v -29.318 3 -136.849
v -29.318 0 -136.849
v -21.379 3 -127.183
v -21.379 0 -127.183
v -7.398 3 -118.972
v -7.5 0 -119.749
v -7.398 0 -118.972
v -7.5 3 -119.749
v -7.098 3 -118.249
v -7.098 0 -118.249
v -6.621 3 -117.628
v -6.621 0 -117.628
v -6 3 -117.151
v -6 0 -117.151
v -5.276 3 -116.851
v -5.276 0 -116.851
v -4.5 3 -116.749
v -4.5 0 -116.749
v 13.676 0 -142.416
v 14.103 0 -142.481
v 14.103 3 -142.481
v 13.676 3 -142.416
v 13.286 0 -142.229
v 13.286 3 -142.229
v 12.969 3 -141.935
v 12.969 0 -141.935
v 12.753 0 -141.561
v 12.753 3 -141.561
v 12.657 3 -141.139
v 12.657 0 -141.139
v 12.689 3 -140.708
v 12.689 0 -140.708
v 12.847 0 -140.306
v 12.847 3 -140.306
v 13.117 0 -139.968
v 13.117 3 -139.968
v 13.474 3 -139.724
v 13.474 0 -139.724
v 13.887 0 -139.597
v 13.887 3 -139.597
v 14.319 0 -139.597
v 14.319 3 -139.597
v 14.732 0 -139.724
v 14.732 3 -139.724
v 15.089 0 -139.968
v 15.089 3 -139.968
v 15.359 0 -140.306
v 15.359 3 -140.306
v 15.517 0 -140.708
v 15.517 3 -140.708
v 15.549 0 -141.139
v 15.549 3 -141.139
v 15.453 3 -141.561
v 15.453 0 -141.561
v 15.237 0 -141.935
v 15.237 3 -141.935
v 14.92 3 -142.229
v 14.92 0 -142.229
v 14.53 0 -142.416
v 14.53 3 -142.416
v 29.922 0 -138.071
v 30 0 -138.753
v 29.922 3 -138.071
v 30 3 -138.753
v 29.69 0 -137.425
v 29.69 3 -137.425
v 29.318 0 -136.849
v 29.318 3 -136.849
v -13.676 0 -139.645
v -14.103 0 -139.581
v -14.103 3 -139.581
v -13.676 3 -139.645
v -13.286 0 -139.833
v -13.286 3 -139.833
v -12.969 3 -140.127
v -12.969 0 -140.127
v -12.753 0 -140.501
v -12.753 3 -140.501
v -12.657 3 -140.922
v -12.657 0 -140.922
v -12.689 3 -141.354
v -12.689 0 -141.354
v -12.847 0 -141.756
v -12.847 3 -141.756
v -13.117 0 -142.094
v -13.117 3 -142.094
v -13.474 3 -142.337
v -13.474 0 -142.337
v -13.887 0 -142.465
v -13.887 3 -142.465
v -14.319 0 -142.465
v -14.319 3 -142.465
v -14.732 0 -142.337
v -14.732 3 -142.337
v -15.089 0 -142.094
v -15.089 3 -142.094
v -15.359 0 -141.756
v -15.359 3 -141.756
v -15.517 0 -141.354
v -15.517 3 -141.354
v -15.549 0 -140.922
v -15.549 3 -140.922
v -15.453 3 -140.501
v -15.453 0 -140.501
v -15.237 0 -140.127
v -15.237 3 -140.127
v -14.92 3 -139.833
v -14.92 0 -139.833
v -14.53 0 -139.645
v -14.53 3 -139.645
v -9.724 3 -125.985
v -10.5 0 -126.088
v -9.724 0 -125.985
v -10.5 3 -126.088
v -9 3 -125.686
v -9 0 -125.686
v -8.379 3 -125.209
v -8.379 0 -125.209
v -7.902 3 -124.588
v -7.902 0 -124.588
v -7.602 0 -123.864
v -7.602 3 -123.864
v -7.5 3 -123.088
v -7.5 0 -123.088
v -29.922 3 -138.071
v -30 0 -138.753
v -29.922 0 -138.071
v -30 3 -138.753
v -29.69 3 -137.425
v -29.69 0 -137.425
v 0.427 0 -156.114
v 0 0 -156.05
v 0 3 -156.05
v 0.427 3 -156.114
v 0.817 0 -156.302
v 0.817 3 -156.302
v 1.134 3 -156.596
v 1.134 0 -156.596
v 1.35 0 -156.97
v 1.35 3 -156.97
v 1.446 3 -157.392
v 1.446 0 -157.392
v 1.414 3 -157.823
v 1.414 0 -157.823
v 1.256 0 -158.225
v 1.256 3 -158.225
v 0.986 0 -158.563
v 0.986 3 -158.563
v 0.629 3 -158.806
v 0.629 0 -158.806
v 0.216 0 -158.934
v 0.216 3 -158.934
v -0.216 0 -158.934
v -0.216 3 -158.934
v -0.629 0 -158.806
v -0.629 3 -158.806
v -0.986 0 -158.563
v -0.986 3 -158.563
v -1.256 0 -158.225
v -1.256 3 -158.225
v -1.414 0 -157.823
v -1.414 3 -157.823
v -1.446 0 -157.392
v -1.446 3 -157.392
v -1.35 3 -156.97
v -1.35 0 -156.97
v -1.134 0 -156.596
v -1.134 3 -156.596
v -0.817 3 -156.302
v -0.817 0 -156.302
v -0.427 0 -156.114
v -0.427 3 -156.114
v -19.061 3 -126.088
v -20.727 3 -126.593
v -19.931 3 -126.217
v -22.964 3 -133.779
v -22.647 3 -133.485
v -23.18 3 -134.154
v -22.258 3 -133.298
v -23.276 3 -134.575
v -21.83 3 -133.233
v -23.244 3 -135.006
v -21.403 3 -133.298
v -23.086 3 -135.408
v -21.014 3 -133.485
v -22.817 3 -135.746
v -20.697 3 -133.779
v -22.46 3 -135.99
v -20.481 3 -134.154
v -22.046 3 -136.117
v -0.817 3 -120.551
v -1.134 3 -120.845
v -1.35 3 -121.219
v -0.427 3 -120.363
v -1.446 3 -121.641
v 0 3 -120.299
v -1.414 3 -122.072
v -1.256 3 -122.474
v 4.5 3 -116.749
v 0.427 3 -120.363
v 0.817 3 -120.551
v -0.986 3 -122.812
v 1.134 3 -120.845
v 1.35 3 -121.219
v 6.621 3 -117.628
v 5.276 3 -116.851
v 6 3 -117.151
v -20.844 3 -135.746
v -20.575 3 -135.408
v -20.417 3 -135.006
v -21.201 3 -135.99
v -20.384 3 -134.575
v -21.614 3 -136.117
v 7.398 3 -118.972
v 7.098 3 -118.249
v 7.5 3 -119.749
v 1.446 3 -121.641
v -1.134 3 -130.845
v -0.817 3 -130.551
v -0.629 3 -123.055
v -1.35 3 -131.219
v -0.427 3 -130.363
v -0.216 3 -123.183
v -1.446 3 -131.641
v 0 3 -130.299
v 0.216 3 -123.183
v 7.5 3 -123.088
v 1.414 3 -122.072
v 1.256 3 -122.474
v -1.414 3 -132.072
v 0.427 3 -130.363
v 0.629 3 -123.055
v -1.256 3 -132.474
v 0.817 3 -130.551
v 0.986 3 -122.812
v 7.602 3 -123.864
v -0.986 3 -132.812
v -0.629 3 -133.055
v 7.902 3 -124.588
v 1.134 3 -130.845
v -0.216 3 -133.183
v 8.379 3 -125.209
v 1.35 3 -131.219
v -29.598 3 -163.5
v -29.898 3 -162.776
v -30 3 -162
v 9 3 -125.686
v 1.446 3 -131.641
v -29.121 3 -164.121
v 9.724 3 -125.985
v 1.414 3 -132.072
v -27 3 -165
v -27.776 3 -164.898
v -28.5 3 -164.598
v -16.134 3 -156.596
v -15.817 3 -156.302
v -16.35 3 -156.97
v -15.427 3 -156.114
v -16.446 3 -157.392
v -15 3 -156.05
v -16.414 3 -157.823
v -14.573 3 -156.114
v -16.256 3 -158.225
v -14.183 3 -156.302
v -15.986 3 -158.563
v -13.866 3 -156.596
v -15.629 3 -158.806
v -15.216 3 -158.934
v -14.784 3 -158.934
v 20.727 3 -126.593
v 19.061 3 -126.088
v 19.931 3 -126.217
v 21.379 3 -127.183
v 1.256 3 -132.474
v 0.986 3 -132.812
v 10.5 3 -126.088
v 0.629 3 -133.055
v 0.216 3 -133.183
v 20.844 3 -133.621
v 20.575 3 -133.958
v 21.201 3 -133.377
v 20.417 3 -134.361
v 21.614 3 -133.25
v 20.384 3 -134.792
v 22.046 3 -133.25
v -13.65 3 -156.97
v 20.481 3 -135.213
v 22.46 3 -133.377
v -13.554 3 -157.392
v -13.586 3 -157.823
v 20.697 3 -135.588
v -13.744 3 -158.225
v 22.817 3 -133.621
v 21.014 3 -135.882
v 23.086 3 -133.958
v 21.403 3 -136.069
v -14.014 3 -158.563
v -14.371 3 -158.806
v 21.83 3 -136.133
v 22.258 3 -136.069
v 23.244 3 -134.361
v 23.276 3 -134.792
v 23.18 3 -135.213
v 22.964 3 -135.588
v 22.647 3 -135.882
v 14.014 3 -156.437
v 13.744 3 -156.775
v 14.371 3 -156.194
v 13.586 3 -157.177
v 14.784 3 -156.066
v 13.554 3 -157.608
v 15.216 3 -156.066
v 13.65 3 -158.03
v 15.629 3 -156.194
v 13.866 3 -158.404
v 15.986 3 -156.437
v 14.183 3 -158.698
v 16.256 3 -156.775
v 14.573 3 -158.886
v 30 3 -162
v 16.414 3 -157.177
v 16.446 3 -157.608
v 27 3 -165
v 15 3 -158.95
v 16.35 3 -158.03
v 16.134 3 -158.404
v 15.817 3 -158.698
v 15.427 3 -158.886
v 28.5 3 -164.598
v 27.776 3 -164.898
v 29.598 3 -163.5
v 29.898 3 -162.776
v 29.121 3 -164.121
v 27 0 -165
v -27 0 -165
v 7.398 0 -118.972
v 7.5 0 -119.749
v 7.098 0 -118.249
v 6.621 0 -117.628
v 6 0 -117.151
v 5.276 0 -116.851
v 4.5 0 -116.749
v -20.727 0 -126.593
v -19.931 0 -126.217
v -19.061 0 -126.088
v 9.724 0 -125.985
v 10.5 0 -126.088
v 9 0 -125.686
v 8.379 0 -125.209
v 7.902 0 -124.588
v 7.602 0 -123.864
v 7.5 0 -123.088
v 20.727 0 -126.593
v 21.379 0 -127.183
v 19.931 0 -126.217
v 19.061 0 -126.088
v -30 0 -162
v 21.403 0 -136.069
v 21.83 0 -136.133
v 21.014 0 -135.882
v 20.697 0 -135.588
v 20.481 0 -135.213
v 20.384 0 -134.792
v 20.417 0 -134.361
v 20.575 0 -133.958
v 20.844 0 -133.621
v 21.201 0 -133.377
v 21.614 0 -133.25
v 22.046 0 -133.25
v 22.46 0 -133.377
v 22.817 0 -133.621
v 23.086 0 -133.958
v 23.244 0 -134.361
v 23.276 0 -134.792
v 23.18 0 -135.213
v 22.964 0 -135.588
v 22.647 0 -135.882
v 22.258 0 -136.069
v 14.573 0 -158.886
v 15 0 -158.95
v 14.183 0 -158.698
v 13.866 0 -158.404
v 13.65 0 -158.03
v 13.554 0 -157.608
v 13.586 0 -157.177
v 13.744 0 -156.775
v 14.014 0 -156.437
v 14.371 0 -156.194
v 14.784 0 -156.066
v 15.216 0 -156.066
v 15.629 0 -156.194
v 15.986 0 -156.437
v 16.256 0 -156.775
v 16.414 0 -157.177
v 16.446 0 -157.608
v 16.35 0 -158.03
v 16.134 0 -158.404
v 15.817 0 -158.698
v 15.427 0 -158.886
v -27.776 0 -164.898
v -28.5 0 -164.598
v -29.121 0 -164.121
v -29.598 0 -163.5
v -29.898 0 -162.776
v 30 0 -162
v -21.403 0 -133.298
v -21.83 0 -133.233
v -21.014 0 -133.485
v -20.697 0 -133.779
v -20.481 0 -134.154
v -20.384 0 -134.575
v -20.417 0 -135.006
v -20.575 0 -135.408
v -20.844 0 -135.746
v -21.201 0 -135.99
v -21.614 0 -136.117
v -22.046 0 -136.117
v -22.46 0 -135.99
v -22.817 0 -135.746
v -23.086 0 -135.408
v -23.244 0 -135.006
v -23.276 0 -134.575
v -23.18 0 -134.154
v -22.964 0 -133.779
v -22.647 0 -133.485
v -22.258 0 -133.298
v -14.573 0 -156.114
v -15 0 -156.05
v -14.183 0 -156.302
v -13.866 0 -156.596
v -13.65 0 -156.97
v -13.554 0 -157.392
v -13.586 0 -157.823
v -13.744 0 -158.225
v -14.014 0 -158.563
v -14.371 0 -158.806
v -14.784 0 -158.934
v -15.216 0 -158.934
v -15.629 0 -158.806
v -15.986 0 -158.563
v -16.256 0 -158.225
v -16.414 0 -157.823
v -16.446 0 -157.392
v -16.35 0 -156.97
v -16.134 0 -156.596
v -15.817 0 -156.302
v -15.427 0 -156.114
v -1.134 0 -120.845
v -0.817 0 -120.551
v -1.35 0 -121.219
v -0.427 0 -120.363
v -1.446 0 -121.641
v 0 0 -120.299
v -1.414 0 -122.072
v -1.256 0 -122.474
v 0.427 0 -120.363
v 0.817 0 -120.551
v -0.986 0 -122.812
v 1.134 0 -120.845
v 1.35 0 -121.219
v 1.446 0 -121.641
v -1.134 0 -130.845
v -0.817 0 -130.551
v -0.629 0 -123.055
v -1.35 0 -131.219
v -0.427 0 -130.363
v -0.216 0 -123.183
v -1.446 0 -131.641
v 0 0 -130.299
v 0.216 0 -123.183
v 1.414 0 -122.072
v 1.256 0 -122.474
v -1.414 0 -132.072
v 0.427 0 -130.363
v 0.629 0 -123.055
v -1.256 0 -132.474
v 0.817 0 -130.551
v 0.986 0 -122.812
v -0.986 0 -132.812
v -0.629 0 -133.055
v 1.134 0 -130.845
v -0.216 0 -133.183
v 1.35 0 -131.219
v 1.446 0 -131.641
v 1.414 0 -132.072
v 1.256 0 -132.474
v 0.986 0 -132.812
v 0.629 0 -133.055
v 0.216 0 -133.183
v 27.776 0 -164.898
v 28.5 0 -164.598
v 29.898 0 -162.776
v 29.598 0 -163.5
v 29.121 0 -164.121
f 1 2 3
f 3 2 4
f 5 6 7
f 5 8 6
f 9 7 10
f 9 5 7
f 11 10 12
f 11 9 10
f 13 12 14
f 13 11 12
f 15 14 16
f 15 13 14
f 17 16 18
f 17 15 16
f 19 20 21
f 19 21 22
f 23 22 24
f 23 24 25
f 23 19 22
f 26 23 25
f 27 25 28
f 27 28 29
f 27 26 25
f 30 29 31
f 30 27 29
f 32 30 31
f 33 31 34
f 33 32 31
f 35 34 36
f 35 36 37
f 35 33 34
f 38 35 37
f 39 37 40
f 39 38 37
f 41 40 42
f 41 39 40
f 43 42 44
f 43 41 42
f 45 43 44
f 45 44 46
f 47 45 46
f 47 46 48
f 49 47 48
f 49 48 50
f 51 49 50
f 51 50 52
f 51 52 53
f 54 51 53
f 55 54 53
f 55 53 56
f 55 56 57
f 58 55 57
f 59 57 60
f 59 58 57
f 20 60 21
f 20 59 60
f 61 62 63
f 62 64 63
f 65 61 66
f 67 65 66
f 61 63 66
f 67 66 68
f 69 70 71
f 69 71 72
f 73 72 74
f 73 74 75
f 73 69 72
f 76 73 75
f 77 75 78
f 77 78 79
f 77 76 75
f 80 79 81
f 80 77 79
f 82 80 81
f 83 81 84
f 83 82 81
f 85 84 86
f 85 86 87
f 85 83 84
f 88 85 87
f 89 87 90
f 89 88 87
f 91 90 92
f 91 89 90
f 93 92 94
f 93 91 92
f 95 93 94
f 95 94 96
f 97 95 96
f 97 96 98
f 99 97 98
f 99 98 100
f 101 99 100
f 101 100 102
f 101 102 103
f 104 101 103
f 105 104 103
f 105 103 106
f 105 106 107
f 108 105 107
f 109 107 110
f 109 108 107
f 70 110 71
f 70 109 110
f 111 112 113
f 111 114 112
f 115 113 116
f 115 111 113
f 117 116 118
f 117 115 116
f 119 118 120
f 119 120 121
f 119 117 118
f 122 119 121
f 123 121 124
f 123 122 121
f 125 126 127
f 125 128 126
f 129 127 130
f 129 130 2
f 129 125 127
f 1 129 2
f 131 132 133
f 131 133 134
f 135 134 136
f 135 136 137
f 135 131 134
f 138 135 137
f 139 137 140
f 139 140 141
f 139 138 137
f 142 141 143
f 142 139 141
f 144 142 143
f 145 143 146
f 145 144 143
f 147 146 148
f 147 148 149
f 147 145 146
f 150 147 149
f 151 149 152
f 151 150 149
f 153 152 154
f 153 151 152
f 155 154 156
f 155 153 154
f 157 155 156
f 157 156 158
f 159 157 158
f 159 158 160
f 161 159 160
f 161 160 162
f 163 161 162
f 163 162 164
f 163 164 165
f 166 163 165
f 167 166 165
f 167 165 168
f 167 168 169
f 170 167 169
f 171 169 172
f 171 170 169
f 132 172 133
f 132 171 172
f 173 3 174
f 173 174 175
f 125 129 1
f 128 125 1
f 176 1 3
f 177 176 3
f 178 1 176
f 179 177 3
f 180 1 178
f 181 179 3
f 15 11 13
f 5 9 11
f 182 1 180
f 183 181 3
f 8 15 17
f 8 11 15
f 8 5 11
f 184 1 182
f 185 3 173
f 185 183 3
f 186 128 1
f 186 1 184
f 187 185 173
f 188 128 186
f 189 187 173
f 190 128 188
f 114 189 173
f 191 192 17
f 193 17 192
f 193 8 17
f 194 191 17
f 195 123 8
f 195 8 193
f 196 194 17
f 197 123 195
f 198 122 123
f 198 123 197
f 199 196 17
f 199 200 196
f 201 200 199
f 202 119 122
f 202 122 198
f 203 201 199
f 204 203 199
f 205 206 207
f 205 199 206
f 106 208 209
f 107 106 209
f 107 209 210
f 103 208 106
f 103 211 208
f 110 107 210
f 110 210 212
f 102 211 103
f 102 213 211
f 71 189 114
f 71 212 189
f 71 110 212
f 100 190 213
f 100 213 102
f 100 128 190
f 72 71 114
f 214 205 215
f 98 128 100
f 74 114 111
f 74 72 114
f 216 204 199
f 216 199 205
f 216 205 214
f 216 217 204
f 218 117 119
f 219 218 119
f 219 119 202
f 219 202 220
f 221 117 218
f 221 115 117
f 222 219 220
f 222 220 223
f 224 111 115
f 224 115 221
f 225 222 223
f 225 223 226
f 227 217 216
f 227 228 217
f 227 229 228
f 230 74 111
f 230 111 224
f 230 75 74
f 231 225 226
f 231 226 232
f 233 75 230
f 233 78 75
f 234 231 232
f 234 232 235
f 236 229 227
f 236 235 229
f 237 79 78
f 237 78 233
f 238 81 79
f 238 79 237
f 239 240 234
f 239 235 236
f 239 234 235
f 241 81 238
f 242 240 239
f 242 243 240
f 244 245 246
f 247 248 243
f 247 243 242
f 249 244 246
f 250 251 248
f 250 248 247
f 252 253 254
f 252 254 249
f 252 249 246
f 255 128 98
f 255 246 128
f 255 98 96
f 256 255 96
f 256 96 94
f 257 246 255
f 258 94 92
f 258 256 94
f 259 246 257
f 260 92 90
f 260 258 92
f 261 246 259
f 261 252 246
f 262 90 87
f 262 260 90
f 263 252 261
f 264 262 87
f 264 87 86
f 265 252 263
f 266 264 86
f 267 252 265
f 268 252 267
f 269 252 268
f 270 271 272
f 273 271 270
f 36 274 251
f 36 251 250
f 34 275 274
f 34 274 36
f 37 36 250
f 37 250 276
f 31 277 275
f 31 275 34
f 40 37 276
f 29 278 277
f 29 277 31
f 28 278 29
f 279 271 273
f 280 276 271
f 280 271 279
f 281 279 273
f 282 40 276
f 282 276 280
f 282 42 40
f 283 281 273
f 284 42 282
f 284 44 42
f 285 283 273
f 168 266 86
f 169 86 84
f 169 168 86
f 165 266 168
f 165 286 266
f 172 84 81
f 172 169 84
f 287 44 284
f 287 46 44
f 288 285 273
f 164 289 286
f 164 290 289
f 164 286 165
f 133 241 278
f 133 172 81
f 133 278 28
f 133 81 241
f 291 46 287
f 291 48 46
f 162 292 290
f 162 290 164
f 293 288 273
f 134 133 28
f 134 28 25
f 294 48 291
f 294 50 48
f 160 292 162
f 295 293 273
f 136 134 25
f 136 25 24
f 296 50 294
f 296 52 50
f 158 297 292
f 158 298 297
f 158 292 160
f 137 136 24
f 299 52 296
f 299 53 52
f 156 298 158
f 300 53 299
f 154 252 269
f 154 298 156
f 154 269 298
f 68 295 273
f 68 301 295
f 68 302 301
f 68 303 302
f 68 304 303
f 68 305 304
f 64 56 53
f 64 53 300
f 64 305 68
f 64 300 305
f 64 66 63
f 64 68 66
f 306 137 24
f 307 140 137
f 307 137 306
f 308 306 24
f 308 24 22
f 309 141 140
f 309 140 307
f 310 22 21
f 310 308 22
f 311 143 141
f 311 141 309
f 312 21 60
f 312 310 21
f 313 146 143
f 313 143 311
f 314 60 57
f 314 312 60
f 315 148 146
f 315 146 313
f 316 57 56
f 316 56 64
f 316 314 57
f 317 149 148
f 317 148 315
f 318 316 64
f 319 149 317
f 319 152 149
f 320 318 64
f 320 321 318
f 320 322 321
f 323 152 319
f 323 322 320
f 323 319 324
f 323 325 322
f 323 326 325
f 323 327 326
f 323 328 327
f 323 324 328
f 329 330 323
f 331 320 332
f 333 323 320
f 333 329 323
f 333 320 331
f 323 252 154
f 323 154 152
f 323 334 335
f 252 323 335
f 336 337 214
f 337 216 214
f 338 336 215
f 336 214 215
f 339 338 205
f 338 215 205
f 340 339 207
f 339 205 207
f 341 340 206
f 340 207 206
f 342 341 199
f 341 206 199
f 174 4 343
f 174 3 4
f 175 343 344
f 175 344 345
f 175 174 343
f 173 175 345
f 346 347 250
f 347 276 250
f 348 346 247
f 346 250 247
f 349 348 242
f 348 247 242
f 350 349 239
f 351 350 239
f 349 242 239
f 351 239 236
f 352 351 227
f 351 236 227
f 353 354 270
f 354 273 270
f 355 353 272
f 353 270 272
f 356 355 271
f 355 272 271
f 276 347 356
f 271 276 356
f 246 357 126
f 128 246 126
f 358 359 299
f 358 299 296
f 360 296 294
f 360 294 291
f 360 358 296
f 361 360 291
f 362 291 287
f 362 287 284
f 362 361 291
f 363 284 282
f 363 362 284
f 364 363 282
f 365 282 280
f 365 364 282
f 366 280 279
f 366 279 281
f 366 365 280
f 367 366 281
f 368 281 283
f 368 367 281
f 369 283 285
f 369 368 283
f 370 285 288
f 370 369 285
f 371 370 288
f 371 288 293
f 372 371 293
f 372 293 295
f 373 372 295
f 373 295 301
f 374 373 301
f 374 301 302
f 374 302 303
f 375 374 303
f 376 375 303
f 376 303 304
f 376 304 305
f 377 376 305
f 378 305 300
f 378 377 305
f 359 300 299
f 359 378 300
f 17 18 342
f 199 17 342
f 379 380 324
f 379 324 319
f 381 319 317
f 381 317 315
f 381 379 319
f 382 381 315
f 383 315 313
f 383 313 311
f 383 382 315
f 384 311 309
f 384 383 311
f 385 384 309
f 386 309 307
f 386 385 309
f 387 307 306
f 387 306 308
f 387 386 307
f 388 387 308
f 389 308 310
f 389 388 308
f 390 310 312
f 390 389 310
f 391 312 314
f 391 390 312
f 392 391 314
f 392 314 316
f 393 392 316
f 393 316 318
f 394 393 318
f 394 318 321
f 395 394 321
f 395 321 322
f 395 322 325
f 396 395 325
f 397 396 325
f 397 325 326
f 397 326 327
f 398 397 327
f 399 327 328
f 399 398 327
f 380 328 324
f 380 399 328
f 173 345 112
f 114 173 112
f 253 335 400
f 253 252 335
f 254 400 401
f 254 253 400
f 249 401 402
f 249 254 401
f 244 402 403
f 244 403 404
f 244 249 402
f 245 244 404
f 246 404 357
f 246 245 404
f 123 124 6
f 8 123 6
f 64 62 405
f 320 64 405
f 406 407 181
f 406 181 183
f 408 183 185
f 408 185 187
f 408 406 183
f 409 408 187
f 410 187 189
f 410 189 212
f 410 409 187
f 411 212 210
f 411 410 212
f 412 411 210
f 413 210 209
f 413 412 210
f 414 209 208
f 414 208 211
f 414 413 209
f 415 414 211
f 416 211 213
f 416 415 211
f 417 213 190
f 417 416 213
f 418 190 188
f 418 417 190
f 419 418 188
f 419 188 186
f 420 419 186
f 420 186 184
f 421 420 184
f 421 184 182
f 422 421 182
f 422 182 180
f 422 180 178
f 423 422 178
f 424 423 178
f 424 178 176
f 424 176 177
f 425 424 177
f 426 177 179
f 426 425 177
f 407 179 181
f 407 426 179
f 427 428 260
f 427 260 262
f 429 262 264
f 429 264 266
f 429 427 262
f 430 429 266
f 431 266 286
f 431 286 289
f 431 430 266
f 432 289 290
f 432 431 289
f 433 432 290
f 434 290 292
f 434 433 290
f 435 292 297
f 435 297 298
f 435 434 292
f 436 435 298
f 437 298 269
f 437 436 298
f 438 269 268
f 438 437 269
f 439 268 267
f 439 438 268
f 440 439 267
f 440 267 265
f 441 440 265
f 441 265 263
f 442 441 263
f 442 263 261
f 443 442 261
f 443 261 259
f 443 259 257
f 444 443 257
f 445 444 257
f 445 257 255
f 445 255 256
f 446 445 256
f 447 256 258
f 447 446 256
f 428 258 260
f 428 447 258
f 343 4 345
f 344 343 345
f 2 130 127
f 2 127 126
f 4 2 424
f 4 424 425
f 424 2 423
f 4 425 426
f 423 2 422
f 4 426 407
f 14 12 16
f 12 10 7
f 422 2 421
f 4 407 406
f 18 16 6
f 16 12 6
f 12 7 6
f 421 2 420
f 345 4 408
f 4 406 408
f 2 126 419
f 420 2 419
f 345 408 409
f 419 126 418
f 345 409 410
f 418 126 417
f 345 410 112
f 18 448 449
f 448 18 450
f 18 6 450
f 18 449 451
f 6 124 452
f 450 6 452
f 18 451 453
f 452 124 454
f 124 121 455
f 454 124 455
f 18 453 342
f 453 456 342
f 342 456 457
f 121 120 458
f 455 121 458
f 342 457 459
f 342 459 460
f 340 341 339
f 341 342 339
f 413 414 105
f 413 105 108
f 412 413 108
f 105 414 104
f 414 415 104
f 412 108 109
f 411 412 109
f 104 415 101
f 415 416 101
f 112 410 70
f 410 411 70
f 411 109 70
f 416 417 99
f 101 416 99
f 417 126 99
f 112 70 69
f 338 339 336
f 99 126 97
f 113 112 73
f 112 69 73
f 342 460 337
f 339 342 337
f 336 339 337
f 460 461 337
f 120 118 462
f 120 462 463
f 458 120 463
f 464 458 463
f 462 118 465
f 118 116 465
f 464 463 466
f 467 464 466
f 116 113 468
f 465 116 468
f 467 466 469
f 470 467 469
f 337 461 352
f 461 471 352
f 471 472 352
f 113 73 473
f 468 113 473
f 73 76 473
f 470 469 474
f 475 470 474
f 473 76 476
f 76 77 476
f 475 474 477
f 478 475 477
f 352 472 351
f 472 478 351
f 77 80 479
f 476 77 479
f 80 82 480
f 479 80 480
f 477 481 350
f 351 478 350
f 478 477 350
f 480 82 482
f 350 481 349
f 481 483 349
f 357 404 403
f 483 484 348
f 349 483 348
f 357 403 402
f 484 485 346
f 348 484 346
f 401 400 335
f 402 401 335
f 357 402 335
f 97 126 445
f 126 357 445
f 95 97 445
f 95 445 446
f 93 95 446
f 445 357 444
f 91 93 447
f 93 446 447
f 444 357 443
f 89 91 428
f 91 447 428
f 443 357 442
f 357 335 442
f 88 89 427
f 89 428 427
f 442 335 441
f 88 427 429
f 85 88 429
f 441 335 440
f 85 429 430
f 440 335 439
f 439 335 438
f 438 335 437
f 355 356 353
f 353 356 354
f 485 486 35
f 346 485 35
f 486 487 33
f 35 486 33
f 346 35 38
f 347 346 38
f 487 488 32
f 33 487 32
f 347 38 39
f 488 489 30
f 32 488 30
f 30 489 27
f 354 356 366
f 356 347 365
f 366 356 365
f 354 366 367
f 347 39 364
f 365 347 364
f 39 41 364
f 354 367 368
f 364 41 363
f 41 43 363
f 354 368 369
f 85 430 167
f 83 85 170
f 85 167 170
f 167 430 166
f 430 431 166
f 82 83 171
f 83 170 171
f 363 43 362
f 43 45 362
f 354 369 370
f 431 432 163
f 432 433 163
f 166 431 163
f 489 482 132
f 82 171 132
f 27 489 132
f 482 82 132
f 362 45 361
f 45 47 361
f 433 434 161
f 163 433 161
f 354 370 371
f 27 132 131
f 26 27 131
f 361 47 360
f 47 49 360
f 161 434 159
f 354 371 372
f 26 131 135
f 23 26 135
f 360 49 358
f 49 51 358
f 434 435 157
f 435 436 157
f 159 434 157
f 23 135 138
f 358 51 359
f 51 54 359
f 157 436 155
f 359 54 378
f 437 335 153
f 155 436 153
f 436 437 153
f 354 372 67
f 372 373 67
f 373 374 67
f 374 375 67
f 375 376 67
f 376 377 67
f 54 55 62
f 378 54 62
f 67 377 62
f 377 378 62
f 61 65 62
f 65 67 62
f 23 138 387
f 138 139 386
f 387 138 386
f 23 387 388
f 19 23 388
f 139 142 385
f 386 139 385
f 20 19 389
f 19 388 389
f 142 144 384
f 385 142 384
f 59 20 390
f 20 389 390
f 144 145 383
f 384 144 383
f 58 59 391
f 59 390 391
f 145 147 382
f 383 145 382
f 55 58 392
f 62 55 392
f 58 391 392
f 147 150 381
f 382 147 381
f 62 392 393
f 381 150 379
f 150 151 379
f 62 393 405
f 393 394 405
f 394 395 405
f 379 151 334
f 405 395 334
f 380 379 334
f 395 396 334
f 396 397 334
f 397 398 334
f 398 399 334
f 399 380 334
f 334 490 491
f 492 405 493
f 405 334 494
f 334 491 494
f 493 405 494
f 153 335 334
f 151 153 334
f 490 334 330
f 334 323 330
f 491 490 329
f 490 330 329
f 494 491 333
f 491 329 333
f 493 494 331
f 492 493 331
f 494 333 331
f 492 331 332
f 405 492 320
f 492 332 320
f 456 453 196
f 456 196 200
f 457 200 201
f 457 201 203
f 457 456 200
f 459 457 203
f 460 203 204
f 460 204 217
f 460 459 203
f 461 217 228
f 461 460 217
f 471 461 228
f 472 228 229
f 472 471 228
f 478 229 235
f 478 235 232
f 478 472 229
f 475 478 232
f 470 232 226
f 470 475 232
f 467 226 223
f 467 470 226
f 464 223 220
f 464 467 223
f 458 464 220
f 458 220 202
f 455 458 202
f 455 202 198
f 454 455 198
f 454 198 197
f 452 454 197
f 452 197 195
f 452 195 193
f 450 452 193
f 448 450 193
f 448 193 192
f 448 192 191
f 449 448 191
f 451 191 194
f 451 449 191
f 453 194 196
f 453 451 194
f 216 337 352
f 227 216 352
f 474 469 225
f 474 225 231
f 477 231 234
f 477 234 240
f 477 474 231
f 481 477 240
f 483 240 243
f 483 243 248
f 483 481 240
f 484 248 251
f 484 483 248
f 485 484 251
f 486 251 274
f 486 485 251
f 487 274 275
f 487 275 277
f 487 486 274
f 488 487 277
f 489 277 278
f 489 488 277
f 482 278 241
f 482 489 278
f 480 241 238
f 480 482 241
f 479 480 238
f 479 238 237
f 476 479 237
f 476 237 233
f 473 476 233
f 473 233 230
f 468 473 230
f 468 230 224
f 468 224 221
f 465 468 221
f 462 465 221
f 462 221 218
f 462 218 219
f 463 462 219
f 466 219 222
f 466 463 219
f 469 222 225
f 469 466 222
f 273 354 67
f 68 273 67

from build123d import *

# Parameters (mm, degrees)
SKETCH_1_R      = 1.45
EXTRUDE_1_DEPTH = 3
FILLET_1_R      = 3


with BuildPart() as part:
    # 草图1 → 凸台-拉伸1 (new body)
    with BuildSketch(Plane(origin=(0, 0, 0), x_dir=(1, 0, 0), z_dir=(0, 1, 0))):
        Polygon((30, 165), (-30, 165), (-30, 137.678611726), (-20.478927243, 126.087702635), (-7.5, 126.087702635), (-7.5, 116.748929431), (7.5, 116.748929431), (7.5, 126.087702635), (20.478927243, 126.087702635), (30, 137.678611726), align=None)
        with Locations(Location((0, 157.5, 0), (0, 0, 270))):
            Circle(SKETCH_1_R, mode=Mode.SUBTRACT)
        with Locations(Location((-15, 157.5, 0), (0, 0, 270))):
            Circle(SKETCH_1_R, mode=Mode.SUBTRACT)
        with Locations(Location((-14.103099985, 141.030854536, 0), (0, 0, 270))):
            Circle(SKETCH_1_R, mode=Mode.SUBTRACT)
        with Locations(Location((-21.830372712, 134.683472697, 0), (0, 0, 270))):
            Circle(SKETCH_1_R, mode=Mode.SUBTRACT)
        with Locations(Location((21.830372712, 134.683472697, 0), (0, 0, 90))):
            Circle(SKETCH_1_R, mode=Mode.SUBTRACT)
        with Locations(Location((14.103099985, 141.030854536, 0), (0, 0, 90))):
            Circle(SKETCH_1_R, mode=Mode.SUBTRACT)
        with Locations(Location((15, 157.5, 0), (0, 0, 90))):
            Circle(SKETCH_1_R, mode=Mode.SUBTRACT)
        with Locations(Location((0, 131.748929431, 0), (0, 0, 270))):
            Circle(SKETCH_1_R, mode=Mode.SUBTRACT)
        with Locations(Location((0, 121.748929431, 0), (0, 0, 270))):
            Circle(SKETCH_1_R, mode=Mode.SUBTRACT)
    extrude(amount=EXTRUDE_1_DEPTH)

    # 圆角1
    fillet_1_edges = [part.edges().sort_by_distance(p)[0] for p in [
        (-30, 1.5, -165),
        (30, 1.5, -165),
        (30, 1.5, -137.678611726),
        (20.478927243, 1.5, -126.087702635),
        (7.5, 1.5, -126.087702635),
        (7.5, 1.5, -116.748929431),
        (-7.5, 1.5, -116.748929431),
        (-7.5, 1.5, -126.087702635),
        (-20.478927243, 1.5, -126.087702635),
        (-30, 1.5, -137.678611726),
    ]]
    fillet(fillet_1_edges, radius=FILLET_1_R)


solid = part.part
